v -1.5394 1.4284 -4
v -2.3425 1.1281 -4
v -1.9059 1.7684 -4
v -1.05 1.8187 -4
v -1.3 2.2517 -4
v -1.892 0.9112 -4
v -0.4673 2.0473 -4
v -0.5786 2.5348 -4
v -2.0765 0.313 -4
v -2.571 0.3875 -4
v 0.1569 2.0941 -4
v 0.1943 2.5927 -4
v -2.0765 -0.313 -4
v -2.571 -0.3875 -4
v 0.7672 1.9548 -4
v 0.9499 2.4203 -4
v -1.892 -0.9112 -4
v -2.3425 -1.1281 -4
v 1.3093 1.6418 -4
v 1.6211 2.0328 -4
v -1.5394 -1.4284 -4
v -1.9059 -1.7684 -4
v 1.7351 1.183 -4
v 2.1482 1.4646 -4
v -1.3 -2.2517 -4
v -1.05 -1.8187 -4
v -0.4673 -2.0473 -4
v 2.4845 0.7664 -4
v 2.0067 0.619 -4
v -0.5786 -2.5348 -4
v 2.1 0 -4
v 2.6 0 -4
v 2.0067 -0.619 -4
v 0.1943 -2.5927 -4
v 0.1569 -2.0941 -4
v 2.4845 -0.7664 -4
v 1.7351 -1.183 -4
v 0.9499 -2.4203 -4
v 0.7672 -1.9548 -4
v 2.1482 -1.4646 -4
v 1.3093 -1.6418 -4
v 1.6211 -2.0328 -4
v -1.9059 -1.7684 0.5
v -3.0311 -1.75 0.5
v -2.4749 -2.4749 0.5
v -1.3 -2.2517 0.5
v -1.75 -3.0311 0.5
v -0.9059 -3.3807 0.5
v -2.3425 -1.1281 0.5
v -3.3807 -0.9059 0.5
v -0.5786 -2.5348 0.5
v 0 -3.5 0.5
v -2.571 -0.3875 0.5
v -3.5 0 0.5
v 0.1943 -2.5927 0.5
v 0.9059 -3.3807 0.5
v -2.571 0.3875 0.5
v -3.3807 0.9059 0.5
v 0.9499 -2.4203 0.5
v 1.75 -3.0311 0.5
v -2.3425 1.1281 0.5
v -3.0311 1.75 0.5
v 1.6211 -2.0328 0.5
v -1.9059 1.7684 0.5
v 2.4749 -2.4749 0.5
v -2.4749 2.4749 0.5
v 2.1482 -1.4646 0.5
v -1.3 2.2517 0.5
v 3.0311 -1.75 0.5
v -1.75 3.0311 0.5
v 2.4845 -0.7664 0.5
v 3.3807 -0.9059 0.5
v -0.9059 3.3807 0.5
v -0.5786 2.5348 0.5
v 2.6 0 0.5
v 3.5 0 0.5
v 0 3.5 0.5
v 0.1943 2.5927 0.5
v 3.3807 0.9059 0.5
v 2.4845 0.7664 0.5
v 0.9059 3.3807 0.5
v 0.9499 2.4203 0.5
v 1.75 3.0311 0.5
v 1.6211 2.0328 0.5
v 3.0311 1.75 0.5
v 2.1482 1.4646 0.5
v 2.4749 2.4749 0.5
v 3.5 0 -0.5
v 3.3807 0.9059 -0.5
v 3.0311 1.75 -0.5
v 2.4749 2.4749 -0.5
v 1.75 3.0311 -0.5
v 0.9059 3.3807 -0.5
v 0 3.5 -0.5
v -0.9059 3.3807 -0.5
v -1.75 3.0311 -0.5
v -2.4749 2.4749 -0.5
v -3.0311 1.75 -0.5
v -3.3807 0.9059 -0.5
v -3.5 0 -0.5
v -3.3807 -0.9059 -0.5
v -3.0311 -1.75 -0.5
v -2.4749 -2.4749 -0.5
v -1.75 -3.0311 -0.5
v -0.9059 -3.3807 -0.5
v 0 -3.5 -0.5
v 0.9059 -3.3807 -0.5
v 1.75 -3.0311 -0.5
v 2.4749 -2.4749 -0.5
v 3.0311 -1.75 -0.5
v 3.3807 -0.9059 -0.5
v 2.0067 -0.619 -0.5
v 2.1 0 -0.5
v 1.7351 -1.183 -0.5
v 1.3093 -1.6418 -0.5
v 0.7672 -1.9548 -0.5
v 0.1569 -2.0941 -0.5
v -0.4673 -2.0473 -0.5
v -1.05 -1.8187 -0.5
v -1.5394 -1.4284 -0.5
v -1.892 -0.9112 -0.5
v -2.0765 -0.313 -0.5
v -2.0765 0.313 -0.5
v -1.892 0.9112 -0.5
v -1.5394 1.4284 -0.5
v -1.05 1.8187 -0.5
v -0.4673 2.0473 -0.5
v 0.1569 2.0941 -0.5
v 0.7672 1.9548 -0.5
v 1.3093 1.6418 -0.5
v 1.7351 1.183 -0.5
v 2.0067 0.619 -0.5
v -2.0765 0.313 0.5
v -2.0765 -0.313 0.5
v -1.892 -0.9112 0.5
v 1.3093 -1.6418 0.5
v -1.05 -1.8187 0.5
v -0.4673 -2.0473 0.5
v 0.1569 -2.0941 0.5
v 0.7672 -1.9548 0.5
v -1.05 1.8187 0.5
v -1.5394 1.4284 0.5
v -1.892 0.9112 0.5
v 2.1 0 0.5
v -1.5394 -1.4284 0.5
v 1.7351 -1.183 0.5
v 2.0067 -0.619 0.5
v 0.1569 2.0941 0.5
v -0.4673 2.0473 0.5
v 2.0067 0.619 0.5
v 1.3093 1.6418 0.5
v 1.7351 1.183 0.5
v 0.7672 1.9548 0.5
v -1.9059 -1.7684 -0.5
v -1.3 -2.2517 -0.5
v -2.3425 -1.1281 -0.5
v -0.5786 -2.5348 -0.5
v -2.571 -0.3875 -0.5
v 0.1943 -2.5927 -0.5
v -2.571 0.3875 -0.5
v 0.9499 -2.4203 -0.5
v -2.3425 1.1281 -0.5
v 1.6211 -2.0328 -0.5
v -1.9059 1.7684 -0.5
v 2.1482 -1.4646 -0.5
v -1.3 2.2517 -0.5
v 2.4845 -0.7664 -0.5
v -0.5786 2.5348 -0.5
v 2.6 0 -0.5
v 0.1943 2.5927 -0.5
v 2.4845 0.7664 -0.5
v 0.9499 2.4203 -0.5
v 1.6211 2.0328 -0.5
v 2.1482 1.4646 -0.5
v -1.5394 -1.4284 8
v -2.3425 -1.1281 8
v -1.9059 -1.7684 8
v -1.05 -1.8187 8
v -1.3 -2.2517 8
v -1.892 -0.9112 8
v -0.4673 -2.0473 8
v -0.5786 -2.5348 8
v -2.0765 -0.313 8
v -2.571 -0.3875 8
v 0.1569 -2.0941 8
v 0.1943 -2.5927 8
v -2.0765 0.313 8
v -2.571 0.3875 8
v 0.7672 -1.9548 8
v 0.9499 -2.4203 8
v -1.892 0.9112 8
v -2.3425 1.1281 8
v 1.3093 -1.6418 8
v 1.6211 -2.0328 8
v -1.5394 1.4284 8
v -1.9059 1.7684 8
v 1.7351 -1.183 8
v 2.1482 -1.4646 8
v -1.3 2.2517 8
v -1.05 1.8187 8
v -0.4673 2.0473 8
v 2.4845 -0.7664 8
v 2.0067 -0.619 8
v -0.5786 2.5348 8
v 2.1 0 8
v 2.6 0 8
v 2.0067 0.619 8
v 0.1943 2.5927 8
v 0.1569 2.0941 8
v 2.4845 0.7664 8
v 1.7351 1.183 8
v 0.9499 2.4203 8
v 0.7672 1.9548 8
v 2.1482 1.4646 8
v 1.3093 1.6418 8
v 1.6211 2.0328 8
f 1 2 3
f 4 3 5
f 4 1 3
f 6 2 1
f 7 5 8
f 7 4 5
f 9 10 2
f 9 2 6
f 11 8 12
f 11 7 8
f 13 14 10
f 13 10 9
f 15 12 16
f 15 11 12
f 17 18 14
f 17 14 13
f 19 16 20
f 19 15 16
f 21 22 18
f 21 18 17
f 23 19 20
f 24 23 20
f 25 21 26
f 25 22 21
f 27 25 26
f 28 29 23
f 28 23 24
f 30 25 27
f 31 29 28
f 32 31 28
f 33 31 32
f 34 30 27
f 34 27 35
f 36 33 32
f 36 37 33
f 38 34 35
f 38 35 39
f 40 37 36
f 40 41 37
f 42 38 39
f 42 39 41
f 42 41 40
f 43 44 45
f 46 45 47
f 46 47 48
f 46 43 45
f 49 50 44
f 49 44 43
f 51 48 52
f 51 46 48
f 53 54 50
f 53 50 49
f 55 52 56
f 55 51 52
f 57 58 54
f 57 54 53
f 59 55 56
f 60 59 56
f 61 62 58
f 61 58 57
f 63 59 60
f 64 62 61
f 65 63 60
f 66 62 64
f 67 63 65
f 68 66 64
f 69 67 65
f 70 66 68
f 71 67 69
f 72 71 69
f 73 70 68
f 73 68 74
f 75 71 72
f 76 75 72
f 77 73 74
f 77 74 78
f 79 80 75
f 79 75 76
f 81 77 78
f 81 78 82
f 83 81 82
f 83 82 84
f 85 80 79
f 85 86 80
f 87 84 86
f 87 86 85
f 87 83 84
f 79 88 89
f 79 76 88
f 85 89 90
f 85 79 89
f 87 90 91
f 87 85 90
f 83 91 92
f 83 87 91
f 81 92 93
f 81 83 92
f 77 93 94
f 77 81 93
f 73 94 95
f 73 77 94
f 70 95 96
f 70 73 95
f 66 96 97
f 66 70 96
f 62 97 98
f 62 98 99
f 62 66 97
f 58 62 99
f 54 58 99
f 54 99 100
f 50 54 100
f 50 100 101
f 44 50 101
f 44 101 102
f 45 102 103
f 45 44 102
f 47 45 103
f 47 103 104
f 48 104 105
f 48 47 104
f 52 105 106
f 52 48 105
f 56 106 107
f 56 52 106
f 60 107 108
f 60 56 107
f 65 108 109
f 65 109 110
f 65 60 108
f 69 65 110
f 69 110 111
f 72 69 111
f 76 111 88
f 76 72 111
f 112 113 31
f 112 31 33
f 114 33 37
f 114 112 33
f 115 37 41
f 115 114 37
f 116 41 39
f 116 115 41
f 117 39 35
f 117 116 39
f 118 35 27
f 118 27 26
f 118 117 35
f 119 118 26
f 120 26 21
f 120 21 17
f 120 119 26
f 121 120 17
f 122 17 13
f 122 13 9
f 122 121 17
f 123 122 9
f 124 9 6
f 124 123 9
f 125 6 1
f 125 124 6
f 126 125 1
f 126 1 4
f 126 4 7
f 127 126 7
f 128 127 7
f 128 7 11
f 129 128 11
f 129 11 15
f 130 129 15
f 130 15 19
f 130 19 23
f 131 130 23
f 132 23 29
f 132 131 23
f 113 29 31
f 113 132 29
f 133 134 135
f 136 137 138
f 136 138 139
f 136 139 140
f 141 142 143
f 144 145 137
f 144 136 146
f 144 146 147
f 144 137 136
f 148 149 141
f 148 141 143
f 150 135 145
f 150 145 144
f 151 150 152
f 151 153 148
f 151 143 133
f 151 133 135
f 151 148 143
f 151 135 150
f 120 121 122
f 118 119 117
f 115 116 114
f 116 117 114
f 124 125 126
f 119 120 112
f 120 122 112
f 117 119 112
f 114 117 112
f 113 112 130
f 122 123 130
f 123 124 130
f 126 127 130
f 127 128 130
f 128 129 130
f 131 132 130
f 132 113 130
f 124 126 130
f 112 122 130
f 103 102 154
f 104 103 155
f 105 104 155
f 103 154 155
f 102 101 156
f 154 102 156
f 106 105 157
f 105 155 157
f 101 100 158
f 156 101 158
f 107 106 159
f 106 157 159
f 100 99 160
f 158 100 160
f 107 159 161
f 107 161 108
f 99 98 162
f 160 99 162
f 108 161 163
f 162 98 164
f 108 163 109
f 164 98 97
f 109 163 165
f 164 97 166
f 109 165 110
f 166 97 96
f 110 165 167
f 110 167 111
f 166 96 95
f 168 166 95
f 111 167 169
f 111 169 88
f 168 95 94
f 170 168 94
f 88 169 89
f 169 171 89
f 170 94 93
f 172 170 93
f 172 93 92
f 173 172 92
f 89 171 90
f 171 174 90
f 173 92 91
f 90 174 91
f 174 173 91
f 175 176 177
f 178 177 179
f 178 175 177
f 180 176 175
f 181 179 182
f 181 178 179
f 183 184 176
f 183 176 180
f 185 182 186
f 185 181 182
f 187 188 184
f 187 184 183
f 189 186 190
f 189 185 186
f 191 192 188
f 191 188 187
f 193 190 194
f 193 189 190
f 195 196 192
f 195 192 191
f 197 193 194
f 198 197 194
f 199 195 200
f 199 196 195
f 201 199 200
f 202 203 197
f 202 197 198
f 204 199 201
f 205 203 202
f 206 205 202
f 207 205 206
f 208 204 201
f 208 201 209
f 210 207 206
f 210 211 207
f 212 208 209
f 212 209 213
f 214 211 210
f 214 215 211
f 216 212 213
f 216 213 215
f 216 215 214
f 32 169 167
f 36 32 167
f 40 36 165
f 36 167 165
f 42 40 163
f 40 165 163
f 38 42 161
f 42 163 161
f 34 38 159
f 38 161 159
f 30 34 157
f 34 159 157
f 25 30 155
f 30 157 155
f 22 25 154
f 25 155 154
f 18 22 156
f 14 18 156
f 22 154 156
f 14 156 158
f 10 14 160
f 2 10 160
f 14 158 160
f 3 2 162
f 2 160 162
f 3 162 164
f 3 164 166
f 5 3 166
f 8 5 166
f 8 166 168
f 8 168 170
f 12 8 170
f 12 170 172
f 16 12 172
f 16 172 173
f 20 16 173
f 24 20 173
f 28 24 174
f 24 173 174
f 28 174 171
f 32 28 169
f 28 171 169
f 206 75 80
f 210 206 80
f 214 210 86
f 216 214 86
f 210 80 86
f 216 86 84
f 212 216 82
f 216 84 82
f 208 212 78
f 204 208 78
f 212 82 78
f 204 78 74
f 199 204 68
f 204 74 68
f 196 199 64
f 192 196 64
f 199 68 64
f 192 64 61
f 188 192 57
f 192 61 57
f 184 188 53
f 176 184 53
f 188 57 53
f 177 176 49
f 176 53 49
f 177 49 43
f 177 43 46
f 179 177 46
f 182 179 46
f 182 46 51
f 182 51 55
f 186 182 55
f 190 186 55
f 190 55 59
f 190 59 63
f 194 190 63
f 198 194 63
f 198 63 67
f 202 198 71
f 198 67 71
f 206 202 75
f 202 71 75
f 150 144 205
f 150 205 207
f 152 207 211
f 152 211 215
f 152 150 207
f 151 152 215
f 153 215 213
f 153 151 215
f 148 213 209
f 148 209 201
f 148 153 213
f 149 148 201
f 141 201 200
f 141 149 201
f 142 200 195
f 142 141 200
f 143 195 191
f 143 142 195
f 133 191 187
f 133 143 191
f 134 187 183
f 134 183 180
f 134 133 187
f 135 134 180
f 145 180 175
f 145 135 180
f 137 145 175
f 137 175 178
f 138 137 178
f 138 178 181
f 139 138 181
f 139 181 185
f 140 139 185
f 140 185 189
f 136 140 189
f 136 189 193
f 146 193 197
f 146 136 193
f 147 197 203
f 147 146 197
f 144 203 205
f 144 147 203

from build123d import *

# Parameters (mm, degrees)
F0_R     = 3.5
F1_DEPTH = 0.5
F2_R     = 2.6
F2_R_2   = 2.1
F3_DEPTH = 7.5
F4_R     = 2.6
F4_R_2   = 2.1
F5_DEPTH = 3.5


with BuildPart() as f1:
    # F0 (on Top) → F1 (new body, symmetric)
    with BuildSketch(Plane.XY):
        Circle(F0_R)
    extrude(amount=F1_DEPTH, both=True)

    # F2 (on face) → F3 (join)
    with BuildSketch(Plane.XY.offset(0.5)):
        Circle(F2_R)
        Circle(F2_R_2, mode=Mode.SUBTRACT)
    extrude(amount=F3_DEPTH)

    # F4 (on face) → F5 (join)
    with BuildSketch(Plane(origin=(0, 0, -0.5), x_dir=(1, 0, 0), z_dir=(0, 0, -1))):
        Circle(F4_R)
        Circle(F4_R_2, mode=Mode.SUBTRACT)
    extrude(amount=F5_DEPTH)


solid = f1.part
